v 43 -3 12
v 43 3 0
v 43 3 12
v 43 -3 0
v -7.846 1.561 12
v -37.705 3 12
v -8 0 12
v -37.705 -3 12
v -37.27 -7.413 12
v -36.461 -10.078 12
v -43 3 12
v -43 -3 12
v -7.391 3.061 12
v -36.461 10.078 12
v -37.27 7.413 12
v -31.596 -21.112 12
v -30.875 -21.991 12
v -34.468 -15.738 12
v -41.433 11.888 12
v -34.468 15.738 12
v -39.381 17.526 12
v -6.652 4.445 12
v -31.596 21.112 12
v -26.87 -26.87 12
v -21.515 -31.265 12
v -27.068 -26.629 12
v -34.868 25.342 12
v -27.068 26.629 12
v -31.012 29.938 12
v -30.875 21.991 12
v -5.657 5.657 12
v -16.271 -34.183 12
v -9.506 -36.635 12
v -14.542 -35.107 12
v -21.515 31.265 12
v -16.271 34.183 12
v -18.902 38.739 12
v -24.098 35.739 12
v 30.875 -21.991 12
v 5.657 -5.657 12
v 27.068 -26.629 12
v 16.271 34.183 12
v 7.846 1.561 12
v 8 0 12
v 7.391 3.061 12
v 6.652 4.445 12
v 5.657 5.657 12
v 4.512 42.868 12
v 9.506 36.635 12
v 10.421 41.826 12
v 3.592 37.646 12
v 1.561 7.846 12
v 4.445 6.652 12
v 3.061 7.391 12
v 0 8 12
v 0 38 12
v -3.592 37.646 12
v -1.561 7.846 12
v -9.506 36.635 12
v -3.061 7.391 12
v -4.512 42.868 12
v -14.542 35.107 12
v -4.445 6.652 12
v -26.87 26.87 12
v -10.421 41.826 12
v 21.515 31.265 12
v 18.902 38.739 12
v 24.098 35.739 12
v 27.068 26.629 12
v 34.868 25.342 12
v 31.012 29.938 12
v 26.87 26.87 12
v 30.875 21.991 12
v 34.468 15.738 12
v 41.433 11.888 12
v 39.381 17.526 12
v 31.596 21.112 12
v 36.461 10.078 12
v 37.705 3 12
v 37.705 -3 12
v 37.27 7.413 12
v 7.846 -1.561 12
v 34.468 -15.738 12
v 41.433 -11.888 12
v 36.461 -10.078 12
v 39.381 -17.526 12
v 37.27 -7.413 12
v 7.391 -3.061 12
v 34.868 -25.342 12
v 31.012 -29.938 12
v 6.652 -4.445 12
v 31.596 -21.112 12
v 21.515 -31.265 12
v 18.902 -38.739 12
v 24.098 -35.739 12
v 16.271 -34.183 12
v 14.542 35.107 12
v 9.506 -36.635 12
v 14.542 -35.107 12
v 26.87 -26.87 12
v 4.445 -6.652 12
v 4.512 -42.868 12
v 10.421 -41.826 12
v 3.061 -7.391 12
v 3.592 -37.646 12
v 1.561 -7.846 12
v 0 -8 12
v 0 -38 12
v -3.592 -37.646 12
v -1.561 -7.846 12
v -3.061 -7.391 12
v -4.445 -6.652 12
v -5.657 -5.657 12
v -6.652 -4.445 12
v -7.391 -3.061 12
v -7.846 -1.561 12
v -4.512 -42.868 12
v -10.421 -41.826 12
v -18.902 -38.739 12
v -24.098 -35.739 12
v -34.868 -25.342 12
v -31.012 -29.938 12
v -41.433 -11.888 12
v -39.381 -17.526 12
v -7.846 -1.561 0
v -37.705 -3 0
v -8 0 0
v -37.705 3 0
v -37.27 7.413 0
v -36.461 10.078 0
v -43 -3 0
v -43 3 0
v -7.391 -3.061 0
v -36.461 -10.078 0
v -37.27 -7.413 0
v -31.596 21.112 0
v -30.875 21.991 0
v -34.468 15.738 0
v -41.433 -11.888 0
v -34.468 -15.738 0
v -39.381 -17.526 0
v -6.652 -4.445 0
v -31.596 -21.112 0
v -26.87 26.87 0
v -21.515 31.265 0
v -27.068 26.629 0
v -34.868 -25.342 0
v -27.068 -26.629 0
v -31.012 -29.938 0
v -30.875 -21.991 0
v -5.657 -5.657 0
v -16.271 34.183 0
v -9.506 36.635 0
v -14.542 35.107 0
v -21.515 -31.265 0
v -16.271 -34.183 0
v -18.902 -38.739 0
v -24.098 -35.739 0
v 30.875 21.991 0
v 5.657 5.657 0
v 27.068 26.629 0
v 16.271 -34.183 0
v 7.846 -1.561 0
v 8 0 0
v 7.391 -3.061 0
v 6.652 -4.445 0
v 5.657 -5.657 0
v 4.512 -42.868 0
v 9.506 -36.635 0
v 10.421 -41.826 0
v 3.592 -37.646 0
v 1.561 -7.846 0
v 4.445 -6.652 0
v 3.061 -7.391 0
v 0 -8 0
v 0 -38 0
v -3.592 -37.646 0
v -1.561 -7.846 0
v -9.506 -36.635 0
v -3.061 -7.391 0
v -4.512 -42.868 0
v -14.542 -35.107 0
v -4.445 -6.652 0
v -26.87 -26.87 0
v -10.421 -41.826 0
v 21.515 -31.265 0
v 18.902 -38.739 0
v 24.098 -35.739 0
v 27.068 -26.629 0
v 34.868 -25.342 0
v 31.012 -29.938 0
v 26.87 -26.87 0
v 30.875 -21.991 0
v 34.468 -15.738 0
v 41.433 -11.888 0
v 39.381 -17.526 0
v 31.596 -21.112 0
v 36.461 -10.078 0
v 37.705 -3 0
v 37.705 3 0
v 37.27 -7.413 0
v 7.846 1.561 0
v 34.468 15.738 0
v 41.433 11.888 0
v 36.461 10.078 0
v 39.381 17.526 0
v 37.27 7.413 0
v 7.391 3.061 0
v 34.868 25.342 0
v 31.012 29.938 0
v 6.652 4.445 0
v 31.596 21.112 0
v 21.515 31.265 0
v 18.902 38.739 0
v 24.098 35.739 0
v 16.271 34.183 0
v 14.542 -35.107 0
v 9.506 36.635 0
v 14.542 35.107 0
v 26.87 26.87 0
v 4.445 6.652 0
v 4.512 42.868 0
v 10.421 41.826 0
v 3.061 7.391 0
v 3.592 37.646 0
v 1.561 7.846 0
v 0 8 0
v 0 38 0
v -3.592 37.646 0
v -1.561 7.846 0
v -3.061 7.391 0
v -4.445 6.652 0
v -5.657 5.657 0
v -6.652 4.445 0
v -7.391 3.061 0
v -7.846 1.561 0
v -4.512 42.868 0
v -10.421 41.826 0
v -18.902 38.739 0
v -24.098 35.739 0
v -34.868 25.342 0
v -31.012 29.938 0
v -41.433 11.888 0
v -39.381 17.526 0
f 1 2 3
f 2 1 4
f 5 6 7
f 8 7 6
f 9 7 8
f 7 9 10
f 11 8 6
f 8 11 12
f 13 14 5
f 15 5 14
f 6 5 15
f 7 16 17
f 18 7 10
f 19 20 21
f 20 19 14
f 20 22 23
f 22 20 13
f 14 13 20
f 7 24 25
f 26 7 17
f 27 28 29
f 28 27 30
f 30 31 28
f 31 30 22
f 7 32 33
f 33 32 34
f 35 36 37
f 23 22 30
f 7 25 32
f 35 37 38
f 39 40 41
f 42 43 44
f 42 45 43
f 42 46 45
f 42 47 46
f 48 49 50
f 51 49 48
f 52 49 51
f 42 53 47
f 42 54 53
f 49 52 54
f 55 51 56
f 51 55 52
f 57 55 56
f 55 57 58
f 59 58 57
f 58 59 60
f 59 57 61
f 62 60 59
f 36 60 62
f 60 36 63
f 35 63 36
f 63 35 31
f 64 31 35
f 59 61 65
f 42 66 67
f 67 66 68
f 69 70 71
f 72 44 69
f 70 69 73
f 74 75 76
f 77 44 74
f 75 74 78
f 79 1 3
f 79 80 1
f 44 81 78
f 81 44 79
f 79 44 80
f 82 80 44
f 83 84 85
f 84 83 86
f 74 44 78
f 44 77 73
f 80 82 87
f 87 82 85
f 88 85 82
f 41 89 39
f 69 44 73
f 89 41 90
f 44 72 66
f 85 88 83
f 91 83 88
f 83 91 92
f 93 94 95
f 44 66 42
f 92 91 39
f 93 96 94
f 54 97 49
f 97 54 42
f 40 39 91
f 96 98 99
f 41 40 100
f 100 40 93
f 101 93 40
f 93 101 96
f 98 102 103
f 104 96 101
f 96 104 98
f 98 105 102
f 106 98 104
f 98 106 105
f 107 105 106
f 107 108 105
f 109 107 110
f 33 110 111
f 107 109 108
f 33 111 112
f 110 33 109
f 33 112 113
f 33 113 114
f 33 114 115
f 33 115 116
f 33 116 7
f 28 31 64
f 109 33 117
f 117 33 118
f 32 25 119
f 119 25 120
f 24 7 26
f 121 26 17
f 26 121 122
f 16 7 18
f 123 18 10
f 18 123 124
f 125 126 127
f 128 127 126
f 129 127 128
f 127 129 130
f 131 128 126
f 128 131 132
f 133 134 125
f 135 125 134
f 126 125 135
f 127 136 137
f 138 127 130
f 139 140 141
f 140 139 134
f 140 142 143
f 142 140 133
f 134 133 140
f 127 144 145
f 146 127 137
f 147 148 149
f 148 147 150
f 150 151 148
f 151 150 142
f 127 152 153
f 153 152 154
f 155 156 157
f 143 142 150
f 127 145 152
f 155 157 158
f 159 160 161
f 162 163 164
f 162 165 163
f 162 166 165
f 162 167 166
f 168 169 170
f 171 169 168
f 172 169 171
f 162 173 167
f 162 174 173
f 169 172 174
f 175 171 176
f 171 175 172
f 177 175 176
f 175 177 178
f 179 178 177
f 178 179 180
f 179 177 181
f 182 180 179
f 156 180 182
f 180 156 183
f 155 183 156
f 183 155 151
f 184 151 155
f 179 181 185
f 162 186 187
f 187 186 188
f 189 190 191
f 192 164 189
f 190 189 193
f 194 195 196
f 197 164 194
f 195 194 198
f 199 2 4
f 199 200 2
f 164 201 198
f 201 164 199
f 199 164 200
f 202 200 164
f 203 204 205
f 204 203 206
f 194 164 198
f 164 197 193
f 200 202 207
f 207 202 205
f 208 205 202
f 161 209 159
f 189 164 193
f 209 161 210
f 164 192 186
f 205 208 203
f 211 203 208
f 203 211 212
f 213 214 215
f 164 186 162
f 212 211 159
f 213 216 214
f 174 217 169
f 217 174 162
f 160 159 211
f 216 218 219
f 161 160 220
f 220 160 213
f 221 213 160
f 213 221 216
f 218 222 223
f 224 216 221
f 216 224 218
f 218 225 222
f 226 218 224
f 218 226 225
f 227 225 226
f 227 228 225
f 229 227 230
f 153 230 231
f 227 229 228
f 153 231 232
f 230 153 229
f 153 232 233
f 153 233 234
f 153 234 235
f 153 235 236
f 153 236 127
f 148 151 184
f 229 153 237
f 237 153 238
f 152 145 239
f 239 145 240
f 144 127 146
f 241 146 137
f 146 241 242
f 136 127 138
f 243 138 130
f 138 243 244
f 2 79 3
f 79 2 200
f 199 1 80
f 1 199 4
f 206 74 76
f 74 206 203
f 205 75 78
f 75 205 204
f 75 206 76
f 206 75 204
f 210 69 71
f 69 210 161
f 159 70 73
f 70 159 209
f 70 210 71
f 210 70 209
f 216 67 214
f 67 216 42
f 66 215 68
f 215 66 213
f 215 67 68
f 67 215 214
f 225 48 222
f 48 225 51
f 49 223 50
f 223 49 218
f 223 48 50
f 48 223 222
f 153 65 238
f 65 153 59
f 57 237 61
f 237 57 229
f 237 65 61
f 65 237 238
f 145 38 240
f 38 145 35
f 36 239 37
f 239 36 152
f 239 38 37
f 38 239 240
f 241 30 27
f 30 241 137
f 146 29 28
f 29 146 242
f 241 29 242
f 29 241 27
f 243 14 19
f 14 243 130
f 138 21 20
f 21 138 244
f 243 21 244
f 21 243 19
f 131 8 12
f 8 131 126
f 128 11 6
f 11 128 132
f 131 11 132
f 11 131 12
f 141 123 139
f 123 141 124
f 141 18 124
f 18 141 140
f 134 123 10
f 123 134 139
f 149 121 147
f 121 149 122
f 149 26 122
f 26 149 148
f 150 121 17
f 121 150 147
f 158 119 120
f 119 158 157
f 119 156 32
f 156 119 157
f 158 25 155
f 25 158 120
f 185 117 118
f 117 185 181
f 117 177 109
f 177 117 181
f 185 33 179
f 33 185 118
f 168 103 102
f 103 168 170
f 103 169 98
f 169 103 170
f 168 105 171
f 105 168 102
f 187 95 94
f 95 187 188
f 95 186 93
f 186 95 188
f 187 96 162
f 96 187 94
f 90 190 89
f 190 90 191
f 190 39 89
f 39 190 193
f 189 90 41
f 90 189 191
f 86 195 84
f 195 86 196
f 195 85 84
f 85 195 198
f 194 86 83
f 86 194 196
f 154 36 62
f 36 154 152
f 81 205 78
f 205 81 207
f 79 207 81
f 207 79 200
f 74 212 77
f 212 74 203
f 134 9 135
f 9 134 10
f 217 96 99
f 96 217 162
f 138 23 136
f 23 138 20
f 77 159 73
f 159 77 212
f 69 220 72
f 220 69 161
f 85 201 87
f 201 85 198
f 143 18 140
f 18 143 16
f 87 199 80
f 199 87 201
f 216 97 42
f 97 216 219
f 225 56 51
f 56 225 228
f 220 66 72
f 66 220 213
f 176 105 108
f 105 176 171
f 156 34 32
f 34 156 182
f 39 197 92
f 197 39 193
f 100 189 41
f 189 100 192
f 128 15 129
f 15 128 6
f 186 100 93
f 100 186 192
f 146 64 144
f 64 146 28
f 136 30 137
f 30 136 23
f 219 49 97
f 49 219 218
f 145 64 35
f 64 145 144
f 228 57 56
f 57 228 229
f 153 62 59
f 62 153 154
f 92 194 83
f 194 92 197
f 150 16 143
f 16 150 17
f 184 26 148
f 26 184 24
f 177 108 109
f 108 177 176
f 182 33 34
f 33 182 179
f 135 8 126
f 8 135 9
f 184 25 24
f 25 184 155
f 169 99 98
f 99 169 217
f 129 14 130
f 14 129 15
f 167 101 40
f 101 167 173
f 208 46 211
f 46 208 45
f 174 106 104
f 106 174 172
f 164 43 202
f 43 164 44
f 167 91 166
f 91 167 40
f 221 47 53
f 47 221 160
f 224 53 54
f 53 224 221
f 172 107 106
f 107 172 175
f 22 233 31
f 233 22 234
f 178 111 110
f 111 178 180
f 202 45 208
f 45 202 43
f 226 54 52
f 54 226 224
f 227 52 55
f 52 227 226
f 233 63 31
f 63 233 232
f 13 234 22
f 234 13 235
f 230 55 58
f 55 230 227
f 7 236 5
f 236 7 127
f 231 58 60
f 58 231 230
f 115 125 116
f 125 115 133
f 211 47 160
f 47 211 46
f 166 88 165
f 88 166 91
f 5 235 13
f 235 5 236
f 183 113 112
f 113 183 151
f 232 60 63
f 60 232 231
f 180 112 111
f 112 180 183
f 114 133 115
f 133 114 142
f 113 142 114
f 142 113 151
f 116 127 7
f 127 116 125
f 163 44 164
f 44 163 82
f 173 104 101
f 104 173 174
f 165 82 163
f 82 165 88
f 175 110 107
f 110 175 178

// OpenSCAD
$fn = 32;

// ----------------------------------------------------------------------
// Spur blank: bored gear blank
// ----------------------------------------------------------------------

// --- parameters (mm) ---
disc_r = 38;              // blank root radius
disc_t = 12;              // blank thickness
n_teeth = 18;             // stub tooth count
tooth_w = 6;              // tooth width at the root
tooth_h = 5;              // tooth height above the root
bore_r = 8;               // central bore radius

out_r = disc_r + tooth_h;  // tip radius
bbox_x = 86.0;  // measured width over the teeth
bbox_y = 85.74;  // measured depth over the teeth

difference() {
union() {
  cylinder(r = disc_r, h = disc_t);
  for (i = [0 : n_teeth - 1])
    rotate([0, 0, i * 360 / n_teeth])
      translate([disc_r - 1, -tooth_w / 2, 0])
        cube([tooth_h + 1, tooth_w, disc_t]);
}
  translate([0, 0, -1]) cylinder(r = bore_r, h = disc_t + 2);
}
